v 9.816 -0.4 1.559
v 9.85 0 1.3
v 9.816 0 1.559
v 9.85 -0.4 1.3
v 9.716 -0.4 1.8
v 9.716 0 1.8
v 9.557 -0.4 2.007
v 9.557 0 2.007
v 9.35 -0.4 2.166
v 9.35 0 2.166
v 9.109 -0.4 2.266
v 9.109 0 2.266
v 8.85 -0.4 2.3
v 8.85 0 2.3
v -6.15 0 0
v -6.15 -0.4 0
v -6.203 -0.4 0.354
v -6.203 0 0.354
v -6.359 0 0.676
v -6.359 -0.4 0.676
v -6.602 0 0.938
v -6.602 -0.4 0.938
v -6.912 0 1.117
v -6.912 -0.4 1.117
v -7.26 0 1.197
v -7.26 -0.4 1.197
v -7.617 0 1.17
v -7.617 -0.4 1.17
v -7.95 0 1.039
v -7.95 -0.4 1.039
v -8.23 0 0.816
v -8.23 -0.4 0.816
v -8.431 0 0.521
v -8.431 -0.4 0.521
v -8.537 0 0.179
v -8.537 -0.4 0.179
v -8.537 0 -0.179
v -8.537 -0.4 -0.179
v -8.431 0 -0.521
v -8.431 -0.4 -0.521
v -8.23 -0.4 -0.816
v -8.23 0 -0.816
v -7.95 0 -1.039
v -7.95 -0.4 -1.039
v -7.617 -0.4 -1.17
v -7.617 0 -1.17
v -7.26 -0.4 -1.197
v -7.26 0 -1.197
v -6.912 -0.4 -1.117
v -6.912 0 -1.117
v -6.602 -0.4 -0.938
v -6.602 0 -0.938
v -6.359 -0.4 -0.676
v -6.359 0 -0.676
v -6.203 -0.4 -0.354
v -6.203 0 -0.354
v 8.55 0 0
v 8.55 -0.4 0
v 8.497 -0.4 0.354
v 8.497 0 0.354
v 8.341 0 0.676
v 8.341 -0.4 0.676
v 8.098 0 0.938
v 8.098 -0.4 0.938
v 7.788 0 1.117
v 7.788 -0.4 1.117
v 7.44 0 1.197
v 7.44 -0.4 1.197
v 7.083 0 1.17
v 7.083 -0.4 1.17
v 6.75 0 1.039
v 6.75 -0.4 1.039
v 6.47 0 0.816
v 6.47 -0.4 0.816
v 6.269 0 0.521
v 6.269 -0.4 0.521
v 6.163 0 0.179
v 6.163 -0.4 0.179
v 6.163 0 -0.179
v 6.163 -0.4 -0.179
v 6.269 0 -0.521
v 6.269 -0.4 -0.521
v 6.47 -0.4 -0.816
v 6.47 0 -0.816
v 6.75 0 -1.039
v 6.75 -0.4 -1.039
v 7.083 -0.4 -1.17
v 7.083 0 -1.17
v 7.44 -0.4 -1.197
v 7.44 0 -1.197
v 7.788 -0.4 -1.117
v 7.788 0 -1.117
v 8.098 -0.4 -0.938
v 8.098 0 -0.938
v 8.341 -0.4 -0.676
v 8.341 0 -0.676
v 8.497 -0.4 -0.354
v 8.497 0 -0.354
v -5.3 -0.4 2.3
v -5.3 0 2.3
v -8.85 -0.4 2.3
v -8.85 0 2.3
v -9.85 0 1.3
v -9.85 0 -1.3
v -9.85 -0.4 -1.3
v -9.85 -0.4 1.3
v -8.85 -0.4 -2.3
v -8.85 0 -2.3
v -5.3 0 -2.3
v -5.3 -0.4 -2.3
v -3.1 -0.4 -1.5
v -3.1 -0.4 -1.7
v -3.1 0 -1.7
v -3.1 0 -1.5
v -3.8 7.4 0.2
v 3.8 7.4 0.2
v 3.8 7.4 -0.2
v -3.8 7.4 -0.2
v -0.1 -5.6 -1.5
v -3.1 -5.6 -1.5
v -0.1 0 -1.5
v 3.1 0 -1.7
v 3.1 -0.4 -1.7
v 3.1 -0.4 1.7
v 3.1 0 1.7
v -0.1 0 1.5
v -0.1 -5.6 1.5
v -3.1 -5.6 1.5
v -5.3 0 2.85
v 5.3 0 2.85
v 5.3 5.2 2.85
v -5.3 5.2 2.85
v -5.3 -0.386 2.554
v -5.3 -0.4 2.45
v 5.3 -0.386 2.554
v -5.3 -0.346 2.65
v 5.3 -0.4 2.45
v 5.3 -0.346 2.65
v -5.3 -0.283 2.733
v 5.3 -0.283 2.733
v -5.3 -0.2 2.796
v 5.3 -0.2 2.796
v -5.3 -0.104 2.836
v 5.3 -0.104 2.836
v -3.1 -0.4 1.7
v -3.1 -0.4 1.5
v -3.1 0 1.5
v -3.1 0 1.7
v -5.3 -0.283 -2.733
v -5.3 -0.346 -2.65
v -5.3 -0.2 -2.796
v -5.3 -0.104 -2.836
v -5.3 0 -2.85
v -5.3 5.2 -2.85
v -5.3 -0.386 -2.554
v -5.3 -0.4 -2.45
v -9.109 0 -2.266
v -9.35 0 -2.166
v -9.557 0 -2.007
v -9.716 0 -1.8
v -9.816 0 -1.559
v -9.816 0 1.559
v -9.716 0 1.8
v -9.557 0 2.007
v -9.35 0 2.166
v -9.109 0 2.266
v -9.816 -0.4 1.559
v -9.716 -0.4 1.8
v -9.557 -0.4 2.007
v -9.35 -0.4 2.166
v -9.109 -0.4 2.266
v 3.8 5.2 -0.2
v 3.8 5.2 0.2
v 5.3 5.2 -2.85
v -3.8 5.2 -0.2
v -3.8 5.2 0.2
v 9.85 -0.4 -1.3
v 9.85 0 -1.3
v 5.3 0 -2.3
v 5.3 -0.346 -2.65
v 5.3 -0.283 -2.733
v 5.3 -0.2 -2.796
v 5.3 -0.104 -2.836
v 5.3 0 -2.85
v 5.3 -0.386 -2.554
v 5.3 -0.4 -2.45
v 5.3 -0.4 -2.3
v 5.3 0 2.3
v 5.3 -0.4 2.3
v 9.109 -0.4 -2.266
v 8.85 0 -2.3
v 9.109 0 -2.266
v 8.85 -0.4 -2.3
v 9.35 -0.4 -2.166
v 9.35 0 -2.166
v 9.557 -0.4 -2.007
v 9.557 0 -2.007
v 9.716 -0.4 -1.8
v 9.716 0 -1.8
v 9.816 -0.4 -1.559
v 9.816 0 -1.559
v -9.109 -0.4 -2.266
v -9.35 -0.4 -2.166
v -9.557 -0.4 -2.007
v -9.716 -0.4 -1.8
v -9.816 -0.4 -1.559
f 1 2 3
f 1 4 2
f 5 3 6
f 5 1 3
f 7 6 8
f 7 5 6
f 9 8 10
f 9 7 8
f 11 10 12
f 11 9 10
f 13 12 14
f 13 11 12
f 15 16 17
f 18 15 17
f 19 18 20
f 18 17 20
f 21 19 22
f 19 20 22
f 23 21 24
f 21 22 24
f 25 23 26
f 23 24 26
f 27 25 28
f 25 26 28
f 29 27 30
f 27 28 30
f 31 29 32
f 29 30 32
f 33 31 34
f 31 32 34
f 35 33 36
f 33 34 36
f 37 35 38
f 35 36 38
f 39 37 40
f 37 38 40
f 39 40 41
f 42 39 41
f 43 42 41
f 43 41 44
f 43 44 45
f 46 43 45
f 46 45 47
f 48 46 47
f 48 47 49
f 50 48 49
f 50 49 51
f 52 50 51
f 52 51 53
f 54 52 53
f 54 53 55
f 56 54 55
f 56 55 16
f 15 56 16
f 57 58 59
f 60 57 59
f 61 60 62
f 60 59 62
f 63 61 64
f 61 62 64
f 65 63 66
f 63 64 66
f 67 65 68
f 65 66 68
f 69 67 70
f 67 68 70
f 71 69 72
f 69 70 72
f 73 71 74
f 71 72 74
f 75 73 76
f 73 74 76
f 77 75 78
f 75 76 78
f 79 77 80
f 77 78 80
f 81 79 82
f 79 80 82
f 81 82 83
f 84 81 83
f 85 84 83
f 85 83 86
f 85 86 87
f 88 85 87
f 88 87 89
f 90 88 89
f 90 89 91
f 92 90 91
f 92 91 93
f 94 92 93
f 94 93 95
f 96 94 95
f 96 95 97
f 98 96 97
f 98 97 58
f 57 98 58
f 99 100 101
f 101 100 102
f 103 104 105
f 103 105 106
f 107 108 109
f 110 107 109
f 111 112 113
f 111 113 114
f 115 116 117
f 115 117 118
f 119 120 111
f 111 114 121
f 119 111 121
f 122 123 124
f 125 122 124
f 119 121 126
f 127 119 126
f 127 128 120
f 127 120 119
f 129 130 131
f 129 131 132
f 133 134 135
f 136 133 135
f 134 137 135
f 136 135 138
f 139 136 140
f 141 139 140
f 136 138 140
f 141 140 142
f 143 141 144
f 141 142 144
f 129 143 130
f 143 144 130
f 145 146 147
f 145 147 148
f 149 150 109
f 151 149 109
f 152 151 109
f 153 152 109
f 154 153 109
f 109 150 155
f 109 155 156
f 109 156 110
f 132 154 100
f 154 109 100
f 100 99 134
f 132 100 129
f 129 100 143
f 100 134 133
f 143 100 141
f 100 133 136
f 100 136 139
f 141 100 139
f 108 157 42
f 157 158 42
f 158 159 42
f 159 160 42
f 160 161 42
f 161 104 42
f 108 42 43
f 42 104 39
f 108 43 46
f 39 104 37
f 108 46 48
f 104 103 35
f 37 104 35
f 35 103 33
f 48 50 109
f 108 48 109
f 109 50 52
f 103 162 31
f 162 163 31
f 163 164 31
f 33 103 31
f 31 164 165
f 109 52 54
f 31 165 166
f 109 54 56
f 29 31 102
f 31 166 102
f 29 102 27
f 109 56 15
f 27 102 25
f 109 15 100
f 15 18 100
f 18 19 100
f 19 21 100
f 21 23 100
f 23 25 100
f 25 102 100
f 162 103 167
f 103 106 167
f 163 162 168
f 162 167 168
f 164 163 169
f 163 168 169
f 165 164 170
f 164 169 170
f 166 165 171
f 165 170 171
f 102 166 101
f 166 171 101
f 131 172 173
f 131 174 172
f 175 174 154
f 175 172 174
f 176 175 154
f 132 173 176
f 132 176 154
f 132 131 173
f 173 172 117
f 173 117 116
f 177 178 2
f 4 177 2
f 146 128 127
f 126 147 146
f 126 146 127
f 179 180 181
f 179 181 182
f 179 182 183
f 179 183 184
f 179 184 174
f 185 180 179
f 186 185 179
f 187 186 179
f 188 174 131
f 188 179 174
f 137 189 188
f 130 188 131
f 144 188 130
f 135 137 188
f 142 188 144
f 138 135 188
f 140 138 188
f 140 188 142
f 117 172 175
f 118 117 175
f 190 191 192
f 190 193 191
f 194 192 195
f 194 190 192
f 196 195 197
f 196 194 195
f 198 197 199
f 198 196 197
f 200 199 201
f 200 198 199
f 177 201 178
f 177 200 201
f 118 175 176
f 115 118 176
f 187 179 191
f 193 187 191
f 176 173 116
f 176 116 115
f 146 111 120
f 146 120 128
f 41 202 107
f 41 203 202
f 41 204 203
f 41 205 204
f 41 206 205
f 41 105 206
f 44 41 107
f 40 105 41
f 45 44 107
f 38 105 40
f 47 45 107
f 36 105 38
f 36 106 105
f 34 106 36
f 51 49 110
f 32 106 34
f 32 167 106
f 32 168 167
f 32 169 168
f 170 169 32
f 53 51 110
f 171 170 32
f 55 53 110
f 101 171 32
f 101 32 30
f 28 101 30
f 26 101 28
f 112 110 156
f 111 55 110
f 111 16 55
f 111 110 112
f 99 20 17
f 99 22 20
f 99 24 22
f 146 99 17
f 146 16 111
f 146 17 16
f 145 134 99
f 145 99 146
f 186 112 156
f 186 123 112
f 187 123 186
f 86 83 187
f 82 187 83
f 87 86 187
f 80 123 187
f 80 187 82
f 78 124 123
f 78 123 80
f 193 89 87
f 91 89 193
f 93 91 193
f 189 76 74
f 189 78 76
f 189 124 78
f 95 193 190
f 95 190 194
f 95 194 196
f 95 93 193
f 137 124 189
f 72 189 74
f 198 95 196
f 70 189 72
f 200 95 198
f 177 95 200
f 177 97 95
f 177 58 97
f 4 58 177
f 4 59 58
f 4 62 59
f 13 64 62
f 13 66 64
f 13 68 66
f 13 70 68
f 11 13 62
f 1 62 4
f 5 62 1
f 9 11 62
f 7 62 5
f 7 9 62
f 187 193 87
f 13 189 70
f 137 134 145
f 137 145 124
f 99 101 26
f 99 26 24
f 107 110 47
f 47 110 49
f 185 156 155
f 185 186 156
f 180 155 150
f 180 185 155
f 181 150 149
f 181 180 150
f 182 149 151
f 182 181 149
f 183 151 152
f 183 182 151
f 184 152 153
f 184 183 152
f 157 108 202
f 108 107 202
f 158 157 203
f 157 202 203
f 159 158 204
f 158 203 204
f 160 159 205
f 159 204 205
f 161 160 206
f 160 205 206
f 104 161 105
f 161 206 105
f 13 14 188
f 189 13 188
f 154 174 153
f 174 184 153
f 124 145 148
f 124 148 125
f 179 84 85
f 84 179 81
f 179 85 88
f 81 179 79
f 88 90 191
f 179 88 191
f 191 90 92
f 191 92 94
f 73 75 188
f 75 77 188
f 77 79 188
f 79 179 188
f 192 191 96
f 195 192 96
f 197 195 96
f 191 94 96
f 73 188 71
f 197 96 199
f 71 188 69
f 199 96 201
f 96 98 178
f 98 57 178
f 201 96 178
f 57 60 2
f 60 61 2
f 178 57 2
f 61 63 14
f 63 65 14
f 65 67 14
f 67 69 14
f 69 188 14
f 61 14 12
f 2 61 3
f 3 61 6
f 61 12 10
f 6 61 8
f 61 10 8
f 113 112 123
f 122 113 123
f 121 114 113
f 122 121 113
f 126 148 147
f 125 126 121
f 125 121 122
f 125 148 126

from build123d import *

# Parameters (mm, degrees)
F0_W      = 4.55
F0_H      = 4.6
F0_W_2    = 10.6
F0_H_2    = 0.55
F1_DEPTH  = 0.4
F2_R      = 1.2
F3_DEPTH  = 0.5
F4_R      = 0.39999
F5_W      = 10.6
F5_H      = 5.7
F6_DEPTH  = 5.2
F7_R      = 1
F8_W      = 6.2
F8_H      = 3.4
F9_DEPTH  = 0.4
F10_W     = 3
F10_H     = 3
F11_DEPTH = 5.6
F12_W     = 7.6
F12_H     = 0.4
F13_DEPTH = 2.2


# Not quite as in the source:
# - a fillet or chamfer is up to 0.001 mm smaller than in the source, because OpenCascade refuses the exact size


with BuildPart() as f1:
    # F0 (on Front) → F1 (new body)
    with BuildSketch(Plane.XZ):
        with Locations((7.575, 0)):
            Rectangle(F0_W, F0_H)
        with Locations((0, -2.575)):
            Rectangle(F0_W_2, F0_H_2)
        Rectangle(F0_W_2, F0_H)
        with Locations((-7.575, 0)):
            Rectangle(F0_W, F0_H)
        with Locations((0, 2.575)):
            Rectangle(F0_W_2, F0_H_2)
    extrude(amount=F1_DEPTH)

    # F2 (on face) → F3 (cut)
    with BuildSketch(Plane.XZ.offset(0.4)):
        with Locations((-7.35, 0)):
            Circle(F2_R)
        with Locations((7.35, 0)):
            Circle(F2_R)
    extrude(amount=-F3_DEPTH, mode=Mode.SUBTRACT)

    # F4 (radius 0.4 in the source; OpenCascade refuses exactly that, so slightly less here)
    f4_edges = [f1.edges().sort_by_distance(p)[0] for p in [
        (0, -0.4, 2.85),
        (0, -0.4, -2.85),
    ]]
    fillet(f4_edges, radius=F4_R)

    # F5 (on face) → F6 (join)
    with BuildSketch(Plane(origin=(0, 0, 0), x_dir=(-1, 0, 0), z_dir=(0, 1, 0))):
        Rectangle(F5_W, F5_H)
    extrude(amount=F6_DEPTH)

    # F7
    f7_edges = [f1.edges().sort_by_distance(p)[0] for p in [
        (9.85, -0.2, 2.3),
        (9.85, -0.2, -2.3),
        (-9.85, -0.2, -2.3),
        (-9.85, -0.2, 2.3),
    ]]
    fillet(f7_edges, radius=F7_R)

    # F8 (on face) → F9 (cut)
    with BuildSketch(Plane.XZ.offset(0.4)):
        Rectangle(F8_W, F8_H)
    extrude(amount=-F9_DEPTH, mode=Mode.SUBTRACT)

    # F10 (on face) → F11 (join)
    with BuildSketch(Plane.XZ):
        with Locations((-1.6, 0)):
            Rectangle(F10_W, F10_H)
    extrude(amount=F11_DEPTH)

    # F12 (on face) → F13 (join)
    with BuildSketch(Plane(origin=(0, 5.2, 0), x_dir=(-1, 0, 0), z_dir=(0, 1, 0))):
        Rectangle(F12_W, F12_H)
    extrude(amount=F13_DEPTH)


solid = f1.part
